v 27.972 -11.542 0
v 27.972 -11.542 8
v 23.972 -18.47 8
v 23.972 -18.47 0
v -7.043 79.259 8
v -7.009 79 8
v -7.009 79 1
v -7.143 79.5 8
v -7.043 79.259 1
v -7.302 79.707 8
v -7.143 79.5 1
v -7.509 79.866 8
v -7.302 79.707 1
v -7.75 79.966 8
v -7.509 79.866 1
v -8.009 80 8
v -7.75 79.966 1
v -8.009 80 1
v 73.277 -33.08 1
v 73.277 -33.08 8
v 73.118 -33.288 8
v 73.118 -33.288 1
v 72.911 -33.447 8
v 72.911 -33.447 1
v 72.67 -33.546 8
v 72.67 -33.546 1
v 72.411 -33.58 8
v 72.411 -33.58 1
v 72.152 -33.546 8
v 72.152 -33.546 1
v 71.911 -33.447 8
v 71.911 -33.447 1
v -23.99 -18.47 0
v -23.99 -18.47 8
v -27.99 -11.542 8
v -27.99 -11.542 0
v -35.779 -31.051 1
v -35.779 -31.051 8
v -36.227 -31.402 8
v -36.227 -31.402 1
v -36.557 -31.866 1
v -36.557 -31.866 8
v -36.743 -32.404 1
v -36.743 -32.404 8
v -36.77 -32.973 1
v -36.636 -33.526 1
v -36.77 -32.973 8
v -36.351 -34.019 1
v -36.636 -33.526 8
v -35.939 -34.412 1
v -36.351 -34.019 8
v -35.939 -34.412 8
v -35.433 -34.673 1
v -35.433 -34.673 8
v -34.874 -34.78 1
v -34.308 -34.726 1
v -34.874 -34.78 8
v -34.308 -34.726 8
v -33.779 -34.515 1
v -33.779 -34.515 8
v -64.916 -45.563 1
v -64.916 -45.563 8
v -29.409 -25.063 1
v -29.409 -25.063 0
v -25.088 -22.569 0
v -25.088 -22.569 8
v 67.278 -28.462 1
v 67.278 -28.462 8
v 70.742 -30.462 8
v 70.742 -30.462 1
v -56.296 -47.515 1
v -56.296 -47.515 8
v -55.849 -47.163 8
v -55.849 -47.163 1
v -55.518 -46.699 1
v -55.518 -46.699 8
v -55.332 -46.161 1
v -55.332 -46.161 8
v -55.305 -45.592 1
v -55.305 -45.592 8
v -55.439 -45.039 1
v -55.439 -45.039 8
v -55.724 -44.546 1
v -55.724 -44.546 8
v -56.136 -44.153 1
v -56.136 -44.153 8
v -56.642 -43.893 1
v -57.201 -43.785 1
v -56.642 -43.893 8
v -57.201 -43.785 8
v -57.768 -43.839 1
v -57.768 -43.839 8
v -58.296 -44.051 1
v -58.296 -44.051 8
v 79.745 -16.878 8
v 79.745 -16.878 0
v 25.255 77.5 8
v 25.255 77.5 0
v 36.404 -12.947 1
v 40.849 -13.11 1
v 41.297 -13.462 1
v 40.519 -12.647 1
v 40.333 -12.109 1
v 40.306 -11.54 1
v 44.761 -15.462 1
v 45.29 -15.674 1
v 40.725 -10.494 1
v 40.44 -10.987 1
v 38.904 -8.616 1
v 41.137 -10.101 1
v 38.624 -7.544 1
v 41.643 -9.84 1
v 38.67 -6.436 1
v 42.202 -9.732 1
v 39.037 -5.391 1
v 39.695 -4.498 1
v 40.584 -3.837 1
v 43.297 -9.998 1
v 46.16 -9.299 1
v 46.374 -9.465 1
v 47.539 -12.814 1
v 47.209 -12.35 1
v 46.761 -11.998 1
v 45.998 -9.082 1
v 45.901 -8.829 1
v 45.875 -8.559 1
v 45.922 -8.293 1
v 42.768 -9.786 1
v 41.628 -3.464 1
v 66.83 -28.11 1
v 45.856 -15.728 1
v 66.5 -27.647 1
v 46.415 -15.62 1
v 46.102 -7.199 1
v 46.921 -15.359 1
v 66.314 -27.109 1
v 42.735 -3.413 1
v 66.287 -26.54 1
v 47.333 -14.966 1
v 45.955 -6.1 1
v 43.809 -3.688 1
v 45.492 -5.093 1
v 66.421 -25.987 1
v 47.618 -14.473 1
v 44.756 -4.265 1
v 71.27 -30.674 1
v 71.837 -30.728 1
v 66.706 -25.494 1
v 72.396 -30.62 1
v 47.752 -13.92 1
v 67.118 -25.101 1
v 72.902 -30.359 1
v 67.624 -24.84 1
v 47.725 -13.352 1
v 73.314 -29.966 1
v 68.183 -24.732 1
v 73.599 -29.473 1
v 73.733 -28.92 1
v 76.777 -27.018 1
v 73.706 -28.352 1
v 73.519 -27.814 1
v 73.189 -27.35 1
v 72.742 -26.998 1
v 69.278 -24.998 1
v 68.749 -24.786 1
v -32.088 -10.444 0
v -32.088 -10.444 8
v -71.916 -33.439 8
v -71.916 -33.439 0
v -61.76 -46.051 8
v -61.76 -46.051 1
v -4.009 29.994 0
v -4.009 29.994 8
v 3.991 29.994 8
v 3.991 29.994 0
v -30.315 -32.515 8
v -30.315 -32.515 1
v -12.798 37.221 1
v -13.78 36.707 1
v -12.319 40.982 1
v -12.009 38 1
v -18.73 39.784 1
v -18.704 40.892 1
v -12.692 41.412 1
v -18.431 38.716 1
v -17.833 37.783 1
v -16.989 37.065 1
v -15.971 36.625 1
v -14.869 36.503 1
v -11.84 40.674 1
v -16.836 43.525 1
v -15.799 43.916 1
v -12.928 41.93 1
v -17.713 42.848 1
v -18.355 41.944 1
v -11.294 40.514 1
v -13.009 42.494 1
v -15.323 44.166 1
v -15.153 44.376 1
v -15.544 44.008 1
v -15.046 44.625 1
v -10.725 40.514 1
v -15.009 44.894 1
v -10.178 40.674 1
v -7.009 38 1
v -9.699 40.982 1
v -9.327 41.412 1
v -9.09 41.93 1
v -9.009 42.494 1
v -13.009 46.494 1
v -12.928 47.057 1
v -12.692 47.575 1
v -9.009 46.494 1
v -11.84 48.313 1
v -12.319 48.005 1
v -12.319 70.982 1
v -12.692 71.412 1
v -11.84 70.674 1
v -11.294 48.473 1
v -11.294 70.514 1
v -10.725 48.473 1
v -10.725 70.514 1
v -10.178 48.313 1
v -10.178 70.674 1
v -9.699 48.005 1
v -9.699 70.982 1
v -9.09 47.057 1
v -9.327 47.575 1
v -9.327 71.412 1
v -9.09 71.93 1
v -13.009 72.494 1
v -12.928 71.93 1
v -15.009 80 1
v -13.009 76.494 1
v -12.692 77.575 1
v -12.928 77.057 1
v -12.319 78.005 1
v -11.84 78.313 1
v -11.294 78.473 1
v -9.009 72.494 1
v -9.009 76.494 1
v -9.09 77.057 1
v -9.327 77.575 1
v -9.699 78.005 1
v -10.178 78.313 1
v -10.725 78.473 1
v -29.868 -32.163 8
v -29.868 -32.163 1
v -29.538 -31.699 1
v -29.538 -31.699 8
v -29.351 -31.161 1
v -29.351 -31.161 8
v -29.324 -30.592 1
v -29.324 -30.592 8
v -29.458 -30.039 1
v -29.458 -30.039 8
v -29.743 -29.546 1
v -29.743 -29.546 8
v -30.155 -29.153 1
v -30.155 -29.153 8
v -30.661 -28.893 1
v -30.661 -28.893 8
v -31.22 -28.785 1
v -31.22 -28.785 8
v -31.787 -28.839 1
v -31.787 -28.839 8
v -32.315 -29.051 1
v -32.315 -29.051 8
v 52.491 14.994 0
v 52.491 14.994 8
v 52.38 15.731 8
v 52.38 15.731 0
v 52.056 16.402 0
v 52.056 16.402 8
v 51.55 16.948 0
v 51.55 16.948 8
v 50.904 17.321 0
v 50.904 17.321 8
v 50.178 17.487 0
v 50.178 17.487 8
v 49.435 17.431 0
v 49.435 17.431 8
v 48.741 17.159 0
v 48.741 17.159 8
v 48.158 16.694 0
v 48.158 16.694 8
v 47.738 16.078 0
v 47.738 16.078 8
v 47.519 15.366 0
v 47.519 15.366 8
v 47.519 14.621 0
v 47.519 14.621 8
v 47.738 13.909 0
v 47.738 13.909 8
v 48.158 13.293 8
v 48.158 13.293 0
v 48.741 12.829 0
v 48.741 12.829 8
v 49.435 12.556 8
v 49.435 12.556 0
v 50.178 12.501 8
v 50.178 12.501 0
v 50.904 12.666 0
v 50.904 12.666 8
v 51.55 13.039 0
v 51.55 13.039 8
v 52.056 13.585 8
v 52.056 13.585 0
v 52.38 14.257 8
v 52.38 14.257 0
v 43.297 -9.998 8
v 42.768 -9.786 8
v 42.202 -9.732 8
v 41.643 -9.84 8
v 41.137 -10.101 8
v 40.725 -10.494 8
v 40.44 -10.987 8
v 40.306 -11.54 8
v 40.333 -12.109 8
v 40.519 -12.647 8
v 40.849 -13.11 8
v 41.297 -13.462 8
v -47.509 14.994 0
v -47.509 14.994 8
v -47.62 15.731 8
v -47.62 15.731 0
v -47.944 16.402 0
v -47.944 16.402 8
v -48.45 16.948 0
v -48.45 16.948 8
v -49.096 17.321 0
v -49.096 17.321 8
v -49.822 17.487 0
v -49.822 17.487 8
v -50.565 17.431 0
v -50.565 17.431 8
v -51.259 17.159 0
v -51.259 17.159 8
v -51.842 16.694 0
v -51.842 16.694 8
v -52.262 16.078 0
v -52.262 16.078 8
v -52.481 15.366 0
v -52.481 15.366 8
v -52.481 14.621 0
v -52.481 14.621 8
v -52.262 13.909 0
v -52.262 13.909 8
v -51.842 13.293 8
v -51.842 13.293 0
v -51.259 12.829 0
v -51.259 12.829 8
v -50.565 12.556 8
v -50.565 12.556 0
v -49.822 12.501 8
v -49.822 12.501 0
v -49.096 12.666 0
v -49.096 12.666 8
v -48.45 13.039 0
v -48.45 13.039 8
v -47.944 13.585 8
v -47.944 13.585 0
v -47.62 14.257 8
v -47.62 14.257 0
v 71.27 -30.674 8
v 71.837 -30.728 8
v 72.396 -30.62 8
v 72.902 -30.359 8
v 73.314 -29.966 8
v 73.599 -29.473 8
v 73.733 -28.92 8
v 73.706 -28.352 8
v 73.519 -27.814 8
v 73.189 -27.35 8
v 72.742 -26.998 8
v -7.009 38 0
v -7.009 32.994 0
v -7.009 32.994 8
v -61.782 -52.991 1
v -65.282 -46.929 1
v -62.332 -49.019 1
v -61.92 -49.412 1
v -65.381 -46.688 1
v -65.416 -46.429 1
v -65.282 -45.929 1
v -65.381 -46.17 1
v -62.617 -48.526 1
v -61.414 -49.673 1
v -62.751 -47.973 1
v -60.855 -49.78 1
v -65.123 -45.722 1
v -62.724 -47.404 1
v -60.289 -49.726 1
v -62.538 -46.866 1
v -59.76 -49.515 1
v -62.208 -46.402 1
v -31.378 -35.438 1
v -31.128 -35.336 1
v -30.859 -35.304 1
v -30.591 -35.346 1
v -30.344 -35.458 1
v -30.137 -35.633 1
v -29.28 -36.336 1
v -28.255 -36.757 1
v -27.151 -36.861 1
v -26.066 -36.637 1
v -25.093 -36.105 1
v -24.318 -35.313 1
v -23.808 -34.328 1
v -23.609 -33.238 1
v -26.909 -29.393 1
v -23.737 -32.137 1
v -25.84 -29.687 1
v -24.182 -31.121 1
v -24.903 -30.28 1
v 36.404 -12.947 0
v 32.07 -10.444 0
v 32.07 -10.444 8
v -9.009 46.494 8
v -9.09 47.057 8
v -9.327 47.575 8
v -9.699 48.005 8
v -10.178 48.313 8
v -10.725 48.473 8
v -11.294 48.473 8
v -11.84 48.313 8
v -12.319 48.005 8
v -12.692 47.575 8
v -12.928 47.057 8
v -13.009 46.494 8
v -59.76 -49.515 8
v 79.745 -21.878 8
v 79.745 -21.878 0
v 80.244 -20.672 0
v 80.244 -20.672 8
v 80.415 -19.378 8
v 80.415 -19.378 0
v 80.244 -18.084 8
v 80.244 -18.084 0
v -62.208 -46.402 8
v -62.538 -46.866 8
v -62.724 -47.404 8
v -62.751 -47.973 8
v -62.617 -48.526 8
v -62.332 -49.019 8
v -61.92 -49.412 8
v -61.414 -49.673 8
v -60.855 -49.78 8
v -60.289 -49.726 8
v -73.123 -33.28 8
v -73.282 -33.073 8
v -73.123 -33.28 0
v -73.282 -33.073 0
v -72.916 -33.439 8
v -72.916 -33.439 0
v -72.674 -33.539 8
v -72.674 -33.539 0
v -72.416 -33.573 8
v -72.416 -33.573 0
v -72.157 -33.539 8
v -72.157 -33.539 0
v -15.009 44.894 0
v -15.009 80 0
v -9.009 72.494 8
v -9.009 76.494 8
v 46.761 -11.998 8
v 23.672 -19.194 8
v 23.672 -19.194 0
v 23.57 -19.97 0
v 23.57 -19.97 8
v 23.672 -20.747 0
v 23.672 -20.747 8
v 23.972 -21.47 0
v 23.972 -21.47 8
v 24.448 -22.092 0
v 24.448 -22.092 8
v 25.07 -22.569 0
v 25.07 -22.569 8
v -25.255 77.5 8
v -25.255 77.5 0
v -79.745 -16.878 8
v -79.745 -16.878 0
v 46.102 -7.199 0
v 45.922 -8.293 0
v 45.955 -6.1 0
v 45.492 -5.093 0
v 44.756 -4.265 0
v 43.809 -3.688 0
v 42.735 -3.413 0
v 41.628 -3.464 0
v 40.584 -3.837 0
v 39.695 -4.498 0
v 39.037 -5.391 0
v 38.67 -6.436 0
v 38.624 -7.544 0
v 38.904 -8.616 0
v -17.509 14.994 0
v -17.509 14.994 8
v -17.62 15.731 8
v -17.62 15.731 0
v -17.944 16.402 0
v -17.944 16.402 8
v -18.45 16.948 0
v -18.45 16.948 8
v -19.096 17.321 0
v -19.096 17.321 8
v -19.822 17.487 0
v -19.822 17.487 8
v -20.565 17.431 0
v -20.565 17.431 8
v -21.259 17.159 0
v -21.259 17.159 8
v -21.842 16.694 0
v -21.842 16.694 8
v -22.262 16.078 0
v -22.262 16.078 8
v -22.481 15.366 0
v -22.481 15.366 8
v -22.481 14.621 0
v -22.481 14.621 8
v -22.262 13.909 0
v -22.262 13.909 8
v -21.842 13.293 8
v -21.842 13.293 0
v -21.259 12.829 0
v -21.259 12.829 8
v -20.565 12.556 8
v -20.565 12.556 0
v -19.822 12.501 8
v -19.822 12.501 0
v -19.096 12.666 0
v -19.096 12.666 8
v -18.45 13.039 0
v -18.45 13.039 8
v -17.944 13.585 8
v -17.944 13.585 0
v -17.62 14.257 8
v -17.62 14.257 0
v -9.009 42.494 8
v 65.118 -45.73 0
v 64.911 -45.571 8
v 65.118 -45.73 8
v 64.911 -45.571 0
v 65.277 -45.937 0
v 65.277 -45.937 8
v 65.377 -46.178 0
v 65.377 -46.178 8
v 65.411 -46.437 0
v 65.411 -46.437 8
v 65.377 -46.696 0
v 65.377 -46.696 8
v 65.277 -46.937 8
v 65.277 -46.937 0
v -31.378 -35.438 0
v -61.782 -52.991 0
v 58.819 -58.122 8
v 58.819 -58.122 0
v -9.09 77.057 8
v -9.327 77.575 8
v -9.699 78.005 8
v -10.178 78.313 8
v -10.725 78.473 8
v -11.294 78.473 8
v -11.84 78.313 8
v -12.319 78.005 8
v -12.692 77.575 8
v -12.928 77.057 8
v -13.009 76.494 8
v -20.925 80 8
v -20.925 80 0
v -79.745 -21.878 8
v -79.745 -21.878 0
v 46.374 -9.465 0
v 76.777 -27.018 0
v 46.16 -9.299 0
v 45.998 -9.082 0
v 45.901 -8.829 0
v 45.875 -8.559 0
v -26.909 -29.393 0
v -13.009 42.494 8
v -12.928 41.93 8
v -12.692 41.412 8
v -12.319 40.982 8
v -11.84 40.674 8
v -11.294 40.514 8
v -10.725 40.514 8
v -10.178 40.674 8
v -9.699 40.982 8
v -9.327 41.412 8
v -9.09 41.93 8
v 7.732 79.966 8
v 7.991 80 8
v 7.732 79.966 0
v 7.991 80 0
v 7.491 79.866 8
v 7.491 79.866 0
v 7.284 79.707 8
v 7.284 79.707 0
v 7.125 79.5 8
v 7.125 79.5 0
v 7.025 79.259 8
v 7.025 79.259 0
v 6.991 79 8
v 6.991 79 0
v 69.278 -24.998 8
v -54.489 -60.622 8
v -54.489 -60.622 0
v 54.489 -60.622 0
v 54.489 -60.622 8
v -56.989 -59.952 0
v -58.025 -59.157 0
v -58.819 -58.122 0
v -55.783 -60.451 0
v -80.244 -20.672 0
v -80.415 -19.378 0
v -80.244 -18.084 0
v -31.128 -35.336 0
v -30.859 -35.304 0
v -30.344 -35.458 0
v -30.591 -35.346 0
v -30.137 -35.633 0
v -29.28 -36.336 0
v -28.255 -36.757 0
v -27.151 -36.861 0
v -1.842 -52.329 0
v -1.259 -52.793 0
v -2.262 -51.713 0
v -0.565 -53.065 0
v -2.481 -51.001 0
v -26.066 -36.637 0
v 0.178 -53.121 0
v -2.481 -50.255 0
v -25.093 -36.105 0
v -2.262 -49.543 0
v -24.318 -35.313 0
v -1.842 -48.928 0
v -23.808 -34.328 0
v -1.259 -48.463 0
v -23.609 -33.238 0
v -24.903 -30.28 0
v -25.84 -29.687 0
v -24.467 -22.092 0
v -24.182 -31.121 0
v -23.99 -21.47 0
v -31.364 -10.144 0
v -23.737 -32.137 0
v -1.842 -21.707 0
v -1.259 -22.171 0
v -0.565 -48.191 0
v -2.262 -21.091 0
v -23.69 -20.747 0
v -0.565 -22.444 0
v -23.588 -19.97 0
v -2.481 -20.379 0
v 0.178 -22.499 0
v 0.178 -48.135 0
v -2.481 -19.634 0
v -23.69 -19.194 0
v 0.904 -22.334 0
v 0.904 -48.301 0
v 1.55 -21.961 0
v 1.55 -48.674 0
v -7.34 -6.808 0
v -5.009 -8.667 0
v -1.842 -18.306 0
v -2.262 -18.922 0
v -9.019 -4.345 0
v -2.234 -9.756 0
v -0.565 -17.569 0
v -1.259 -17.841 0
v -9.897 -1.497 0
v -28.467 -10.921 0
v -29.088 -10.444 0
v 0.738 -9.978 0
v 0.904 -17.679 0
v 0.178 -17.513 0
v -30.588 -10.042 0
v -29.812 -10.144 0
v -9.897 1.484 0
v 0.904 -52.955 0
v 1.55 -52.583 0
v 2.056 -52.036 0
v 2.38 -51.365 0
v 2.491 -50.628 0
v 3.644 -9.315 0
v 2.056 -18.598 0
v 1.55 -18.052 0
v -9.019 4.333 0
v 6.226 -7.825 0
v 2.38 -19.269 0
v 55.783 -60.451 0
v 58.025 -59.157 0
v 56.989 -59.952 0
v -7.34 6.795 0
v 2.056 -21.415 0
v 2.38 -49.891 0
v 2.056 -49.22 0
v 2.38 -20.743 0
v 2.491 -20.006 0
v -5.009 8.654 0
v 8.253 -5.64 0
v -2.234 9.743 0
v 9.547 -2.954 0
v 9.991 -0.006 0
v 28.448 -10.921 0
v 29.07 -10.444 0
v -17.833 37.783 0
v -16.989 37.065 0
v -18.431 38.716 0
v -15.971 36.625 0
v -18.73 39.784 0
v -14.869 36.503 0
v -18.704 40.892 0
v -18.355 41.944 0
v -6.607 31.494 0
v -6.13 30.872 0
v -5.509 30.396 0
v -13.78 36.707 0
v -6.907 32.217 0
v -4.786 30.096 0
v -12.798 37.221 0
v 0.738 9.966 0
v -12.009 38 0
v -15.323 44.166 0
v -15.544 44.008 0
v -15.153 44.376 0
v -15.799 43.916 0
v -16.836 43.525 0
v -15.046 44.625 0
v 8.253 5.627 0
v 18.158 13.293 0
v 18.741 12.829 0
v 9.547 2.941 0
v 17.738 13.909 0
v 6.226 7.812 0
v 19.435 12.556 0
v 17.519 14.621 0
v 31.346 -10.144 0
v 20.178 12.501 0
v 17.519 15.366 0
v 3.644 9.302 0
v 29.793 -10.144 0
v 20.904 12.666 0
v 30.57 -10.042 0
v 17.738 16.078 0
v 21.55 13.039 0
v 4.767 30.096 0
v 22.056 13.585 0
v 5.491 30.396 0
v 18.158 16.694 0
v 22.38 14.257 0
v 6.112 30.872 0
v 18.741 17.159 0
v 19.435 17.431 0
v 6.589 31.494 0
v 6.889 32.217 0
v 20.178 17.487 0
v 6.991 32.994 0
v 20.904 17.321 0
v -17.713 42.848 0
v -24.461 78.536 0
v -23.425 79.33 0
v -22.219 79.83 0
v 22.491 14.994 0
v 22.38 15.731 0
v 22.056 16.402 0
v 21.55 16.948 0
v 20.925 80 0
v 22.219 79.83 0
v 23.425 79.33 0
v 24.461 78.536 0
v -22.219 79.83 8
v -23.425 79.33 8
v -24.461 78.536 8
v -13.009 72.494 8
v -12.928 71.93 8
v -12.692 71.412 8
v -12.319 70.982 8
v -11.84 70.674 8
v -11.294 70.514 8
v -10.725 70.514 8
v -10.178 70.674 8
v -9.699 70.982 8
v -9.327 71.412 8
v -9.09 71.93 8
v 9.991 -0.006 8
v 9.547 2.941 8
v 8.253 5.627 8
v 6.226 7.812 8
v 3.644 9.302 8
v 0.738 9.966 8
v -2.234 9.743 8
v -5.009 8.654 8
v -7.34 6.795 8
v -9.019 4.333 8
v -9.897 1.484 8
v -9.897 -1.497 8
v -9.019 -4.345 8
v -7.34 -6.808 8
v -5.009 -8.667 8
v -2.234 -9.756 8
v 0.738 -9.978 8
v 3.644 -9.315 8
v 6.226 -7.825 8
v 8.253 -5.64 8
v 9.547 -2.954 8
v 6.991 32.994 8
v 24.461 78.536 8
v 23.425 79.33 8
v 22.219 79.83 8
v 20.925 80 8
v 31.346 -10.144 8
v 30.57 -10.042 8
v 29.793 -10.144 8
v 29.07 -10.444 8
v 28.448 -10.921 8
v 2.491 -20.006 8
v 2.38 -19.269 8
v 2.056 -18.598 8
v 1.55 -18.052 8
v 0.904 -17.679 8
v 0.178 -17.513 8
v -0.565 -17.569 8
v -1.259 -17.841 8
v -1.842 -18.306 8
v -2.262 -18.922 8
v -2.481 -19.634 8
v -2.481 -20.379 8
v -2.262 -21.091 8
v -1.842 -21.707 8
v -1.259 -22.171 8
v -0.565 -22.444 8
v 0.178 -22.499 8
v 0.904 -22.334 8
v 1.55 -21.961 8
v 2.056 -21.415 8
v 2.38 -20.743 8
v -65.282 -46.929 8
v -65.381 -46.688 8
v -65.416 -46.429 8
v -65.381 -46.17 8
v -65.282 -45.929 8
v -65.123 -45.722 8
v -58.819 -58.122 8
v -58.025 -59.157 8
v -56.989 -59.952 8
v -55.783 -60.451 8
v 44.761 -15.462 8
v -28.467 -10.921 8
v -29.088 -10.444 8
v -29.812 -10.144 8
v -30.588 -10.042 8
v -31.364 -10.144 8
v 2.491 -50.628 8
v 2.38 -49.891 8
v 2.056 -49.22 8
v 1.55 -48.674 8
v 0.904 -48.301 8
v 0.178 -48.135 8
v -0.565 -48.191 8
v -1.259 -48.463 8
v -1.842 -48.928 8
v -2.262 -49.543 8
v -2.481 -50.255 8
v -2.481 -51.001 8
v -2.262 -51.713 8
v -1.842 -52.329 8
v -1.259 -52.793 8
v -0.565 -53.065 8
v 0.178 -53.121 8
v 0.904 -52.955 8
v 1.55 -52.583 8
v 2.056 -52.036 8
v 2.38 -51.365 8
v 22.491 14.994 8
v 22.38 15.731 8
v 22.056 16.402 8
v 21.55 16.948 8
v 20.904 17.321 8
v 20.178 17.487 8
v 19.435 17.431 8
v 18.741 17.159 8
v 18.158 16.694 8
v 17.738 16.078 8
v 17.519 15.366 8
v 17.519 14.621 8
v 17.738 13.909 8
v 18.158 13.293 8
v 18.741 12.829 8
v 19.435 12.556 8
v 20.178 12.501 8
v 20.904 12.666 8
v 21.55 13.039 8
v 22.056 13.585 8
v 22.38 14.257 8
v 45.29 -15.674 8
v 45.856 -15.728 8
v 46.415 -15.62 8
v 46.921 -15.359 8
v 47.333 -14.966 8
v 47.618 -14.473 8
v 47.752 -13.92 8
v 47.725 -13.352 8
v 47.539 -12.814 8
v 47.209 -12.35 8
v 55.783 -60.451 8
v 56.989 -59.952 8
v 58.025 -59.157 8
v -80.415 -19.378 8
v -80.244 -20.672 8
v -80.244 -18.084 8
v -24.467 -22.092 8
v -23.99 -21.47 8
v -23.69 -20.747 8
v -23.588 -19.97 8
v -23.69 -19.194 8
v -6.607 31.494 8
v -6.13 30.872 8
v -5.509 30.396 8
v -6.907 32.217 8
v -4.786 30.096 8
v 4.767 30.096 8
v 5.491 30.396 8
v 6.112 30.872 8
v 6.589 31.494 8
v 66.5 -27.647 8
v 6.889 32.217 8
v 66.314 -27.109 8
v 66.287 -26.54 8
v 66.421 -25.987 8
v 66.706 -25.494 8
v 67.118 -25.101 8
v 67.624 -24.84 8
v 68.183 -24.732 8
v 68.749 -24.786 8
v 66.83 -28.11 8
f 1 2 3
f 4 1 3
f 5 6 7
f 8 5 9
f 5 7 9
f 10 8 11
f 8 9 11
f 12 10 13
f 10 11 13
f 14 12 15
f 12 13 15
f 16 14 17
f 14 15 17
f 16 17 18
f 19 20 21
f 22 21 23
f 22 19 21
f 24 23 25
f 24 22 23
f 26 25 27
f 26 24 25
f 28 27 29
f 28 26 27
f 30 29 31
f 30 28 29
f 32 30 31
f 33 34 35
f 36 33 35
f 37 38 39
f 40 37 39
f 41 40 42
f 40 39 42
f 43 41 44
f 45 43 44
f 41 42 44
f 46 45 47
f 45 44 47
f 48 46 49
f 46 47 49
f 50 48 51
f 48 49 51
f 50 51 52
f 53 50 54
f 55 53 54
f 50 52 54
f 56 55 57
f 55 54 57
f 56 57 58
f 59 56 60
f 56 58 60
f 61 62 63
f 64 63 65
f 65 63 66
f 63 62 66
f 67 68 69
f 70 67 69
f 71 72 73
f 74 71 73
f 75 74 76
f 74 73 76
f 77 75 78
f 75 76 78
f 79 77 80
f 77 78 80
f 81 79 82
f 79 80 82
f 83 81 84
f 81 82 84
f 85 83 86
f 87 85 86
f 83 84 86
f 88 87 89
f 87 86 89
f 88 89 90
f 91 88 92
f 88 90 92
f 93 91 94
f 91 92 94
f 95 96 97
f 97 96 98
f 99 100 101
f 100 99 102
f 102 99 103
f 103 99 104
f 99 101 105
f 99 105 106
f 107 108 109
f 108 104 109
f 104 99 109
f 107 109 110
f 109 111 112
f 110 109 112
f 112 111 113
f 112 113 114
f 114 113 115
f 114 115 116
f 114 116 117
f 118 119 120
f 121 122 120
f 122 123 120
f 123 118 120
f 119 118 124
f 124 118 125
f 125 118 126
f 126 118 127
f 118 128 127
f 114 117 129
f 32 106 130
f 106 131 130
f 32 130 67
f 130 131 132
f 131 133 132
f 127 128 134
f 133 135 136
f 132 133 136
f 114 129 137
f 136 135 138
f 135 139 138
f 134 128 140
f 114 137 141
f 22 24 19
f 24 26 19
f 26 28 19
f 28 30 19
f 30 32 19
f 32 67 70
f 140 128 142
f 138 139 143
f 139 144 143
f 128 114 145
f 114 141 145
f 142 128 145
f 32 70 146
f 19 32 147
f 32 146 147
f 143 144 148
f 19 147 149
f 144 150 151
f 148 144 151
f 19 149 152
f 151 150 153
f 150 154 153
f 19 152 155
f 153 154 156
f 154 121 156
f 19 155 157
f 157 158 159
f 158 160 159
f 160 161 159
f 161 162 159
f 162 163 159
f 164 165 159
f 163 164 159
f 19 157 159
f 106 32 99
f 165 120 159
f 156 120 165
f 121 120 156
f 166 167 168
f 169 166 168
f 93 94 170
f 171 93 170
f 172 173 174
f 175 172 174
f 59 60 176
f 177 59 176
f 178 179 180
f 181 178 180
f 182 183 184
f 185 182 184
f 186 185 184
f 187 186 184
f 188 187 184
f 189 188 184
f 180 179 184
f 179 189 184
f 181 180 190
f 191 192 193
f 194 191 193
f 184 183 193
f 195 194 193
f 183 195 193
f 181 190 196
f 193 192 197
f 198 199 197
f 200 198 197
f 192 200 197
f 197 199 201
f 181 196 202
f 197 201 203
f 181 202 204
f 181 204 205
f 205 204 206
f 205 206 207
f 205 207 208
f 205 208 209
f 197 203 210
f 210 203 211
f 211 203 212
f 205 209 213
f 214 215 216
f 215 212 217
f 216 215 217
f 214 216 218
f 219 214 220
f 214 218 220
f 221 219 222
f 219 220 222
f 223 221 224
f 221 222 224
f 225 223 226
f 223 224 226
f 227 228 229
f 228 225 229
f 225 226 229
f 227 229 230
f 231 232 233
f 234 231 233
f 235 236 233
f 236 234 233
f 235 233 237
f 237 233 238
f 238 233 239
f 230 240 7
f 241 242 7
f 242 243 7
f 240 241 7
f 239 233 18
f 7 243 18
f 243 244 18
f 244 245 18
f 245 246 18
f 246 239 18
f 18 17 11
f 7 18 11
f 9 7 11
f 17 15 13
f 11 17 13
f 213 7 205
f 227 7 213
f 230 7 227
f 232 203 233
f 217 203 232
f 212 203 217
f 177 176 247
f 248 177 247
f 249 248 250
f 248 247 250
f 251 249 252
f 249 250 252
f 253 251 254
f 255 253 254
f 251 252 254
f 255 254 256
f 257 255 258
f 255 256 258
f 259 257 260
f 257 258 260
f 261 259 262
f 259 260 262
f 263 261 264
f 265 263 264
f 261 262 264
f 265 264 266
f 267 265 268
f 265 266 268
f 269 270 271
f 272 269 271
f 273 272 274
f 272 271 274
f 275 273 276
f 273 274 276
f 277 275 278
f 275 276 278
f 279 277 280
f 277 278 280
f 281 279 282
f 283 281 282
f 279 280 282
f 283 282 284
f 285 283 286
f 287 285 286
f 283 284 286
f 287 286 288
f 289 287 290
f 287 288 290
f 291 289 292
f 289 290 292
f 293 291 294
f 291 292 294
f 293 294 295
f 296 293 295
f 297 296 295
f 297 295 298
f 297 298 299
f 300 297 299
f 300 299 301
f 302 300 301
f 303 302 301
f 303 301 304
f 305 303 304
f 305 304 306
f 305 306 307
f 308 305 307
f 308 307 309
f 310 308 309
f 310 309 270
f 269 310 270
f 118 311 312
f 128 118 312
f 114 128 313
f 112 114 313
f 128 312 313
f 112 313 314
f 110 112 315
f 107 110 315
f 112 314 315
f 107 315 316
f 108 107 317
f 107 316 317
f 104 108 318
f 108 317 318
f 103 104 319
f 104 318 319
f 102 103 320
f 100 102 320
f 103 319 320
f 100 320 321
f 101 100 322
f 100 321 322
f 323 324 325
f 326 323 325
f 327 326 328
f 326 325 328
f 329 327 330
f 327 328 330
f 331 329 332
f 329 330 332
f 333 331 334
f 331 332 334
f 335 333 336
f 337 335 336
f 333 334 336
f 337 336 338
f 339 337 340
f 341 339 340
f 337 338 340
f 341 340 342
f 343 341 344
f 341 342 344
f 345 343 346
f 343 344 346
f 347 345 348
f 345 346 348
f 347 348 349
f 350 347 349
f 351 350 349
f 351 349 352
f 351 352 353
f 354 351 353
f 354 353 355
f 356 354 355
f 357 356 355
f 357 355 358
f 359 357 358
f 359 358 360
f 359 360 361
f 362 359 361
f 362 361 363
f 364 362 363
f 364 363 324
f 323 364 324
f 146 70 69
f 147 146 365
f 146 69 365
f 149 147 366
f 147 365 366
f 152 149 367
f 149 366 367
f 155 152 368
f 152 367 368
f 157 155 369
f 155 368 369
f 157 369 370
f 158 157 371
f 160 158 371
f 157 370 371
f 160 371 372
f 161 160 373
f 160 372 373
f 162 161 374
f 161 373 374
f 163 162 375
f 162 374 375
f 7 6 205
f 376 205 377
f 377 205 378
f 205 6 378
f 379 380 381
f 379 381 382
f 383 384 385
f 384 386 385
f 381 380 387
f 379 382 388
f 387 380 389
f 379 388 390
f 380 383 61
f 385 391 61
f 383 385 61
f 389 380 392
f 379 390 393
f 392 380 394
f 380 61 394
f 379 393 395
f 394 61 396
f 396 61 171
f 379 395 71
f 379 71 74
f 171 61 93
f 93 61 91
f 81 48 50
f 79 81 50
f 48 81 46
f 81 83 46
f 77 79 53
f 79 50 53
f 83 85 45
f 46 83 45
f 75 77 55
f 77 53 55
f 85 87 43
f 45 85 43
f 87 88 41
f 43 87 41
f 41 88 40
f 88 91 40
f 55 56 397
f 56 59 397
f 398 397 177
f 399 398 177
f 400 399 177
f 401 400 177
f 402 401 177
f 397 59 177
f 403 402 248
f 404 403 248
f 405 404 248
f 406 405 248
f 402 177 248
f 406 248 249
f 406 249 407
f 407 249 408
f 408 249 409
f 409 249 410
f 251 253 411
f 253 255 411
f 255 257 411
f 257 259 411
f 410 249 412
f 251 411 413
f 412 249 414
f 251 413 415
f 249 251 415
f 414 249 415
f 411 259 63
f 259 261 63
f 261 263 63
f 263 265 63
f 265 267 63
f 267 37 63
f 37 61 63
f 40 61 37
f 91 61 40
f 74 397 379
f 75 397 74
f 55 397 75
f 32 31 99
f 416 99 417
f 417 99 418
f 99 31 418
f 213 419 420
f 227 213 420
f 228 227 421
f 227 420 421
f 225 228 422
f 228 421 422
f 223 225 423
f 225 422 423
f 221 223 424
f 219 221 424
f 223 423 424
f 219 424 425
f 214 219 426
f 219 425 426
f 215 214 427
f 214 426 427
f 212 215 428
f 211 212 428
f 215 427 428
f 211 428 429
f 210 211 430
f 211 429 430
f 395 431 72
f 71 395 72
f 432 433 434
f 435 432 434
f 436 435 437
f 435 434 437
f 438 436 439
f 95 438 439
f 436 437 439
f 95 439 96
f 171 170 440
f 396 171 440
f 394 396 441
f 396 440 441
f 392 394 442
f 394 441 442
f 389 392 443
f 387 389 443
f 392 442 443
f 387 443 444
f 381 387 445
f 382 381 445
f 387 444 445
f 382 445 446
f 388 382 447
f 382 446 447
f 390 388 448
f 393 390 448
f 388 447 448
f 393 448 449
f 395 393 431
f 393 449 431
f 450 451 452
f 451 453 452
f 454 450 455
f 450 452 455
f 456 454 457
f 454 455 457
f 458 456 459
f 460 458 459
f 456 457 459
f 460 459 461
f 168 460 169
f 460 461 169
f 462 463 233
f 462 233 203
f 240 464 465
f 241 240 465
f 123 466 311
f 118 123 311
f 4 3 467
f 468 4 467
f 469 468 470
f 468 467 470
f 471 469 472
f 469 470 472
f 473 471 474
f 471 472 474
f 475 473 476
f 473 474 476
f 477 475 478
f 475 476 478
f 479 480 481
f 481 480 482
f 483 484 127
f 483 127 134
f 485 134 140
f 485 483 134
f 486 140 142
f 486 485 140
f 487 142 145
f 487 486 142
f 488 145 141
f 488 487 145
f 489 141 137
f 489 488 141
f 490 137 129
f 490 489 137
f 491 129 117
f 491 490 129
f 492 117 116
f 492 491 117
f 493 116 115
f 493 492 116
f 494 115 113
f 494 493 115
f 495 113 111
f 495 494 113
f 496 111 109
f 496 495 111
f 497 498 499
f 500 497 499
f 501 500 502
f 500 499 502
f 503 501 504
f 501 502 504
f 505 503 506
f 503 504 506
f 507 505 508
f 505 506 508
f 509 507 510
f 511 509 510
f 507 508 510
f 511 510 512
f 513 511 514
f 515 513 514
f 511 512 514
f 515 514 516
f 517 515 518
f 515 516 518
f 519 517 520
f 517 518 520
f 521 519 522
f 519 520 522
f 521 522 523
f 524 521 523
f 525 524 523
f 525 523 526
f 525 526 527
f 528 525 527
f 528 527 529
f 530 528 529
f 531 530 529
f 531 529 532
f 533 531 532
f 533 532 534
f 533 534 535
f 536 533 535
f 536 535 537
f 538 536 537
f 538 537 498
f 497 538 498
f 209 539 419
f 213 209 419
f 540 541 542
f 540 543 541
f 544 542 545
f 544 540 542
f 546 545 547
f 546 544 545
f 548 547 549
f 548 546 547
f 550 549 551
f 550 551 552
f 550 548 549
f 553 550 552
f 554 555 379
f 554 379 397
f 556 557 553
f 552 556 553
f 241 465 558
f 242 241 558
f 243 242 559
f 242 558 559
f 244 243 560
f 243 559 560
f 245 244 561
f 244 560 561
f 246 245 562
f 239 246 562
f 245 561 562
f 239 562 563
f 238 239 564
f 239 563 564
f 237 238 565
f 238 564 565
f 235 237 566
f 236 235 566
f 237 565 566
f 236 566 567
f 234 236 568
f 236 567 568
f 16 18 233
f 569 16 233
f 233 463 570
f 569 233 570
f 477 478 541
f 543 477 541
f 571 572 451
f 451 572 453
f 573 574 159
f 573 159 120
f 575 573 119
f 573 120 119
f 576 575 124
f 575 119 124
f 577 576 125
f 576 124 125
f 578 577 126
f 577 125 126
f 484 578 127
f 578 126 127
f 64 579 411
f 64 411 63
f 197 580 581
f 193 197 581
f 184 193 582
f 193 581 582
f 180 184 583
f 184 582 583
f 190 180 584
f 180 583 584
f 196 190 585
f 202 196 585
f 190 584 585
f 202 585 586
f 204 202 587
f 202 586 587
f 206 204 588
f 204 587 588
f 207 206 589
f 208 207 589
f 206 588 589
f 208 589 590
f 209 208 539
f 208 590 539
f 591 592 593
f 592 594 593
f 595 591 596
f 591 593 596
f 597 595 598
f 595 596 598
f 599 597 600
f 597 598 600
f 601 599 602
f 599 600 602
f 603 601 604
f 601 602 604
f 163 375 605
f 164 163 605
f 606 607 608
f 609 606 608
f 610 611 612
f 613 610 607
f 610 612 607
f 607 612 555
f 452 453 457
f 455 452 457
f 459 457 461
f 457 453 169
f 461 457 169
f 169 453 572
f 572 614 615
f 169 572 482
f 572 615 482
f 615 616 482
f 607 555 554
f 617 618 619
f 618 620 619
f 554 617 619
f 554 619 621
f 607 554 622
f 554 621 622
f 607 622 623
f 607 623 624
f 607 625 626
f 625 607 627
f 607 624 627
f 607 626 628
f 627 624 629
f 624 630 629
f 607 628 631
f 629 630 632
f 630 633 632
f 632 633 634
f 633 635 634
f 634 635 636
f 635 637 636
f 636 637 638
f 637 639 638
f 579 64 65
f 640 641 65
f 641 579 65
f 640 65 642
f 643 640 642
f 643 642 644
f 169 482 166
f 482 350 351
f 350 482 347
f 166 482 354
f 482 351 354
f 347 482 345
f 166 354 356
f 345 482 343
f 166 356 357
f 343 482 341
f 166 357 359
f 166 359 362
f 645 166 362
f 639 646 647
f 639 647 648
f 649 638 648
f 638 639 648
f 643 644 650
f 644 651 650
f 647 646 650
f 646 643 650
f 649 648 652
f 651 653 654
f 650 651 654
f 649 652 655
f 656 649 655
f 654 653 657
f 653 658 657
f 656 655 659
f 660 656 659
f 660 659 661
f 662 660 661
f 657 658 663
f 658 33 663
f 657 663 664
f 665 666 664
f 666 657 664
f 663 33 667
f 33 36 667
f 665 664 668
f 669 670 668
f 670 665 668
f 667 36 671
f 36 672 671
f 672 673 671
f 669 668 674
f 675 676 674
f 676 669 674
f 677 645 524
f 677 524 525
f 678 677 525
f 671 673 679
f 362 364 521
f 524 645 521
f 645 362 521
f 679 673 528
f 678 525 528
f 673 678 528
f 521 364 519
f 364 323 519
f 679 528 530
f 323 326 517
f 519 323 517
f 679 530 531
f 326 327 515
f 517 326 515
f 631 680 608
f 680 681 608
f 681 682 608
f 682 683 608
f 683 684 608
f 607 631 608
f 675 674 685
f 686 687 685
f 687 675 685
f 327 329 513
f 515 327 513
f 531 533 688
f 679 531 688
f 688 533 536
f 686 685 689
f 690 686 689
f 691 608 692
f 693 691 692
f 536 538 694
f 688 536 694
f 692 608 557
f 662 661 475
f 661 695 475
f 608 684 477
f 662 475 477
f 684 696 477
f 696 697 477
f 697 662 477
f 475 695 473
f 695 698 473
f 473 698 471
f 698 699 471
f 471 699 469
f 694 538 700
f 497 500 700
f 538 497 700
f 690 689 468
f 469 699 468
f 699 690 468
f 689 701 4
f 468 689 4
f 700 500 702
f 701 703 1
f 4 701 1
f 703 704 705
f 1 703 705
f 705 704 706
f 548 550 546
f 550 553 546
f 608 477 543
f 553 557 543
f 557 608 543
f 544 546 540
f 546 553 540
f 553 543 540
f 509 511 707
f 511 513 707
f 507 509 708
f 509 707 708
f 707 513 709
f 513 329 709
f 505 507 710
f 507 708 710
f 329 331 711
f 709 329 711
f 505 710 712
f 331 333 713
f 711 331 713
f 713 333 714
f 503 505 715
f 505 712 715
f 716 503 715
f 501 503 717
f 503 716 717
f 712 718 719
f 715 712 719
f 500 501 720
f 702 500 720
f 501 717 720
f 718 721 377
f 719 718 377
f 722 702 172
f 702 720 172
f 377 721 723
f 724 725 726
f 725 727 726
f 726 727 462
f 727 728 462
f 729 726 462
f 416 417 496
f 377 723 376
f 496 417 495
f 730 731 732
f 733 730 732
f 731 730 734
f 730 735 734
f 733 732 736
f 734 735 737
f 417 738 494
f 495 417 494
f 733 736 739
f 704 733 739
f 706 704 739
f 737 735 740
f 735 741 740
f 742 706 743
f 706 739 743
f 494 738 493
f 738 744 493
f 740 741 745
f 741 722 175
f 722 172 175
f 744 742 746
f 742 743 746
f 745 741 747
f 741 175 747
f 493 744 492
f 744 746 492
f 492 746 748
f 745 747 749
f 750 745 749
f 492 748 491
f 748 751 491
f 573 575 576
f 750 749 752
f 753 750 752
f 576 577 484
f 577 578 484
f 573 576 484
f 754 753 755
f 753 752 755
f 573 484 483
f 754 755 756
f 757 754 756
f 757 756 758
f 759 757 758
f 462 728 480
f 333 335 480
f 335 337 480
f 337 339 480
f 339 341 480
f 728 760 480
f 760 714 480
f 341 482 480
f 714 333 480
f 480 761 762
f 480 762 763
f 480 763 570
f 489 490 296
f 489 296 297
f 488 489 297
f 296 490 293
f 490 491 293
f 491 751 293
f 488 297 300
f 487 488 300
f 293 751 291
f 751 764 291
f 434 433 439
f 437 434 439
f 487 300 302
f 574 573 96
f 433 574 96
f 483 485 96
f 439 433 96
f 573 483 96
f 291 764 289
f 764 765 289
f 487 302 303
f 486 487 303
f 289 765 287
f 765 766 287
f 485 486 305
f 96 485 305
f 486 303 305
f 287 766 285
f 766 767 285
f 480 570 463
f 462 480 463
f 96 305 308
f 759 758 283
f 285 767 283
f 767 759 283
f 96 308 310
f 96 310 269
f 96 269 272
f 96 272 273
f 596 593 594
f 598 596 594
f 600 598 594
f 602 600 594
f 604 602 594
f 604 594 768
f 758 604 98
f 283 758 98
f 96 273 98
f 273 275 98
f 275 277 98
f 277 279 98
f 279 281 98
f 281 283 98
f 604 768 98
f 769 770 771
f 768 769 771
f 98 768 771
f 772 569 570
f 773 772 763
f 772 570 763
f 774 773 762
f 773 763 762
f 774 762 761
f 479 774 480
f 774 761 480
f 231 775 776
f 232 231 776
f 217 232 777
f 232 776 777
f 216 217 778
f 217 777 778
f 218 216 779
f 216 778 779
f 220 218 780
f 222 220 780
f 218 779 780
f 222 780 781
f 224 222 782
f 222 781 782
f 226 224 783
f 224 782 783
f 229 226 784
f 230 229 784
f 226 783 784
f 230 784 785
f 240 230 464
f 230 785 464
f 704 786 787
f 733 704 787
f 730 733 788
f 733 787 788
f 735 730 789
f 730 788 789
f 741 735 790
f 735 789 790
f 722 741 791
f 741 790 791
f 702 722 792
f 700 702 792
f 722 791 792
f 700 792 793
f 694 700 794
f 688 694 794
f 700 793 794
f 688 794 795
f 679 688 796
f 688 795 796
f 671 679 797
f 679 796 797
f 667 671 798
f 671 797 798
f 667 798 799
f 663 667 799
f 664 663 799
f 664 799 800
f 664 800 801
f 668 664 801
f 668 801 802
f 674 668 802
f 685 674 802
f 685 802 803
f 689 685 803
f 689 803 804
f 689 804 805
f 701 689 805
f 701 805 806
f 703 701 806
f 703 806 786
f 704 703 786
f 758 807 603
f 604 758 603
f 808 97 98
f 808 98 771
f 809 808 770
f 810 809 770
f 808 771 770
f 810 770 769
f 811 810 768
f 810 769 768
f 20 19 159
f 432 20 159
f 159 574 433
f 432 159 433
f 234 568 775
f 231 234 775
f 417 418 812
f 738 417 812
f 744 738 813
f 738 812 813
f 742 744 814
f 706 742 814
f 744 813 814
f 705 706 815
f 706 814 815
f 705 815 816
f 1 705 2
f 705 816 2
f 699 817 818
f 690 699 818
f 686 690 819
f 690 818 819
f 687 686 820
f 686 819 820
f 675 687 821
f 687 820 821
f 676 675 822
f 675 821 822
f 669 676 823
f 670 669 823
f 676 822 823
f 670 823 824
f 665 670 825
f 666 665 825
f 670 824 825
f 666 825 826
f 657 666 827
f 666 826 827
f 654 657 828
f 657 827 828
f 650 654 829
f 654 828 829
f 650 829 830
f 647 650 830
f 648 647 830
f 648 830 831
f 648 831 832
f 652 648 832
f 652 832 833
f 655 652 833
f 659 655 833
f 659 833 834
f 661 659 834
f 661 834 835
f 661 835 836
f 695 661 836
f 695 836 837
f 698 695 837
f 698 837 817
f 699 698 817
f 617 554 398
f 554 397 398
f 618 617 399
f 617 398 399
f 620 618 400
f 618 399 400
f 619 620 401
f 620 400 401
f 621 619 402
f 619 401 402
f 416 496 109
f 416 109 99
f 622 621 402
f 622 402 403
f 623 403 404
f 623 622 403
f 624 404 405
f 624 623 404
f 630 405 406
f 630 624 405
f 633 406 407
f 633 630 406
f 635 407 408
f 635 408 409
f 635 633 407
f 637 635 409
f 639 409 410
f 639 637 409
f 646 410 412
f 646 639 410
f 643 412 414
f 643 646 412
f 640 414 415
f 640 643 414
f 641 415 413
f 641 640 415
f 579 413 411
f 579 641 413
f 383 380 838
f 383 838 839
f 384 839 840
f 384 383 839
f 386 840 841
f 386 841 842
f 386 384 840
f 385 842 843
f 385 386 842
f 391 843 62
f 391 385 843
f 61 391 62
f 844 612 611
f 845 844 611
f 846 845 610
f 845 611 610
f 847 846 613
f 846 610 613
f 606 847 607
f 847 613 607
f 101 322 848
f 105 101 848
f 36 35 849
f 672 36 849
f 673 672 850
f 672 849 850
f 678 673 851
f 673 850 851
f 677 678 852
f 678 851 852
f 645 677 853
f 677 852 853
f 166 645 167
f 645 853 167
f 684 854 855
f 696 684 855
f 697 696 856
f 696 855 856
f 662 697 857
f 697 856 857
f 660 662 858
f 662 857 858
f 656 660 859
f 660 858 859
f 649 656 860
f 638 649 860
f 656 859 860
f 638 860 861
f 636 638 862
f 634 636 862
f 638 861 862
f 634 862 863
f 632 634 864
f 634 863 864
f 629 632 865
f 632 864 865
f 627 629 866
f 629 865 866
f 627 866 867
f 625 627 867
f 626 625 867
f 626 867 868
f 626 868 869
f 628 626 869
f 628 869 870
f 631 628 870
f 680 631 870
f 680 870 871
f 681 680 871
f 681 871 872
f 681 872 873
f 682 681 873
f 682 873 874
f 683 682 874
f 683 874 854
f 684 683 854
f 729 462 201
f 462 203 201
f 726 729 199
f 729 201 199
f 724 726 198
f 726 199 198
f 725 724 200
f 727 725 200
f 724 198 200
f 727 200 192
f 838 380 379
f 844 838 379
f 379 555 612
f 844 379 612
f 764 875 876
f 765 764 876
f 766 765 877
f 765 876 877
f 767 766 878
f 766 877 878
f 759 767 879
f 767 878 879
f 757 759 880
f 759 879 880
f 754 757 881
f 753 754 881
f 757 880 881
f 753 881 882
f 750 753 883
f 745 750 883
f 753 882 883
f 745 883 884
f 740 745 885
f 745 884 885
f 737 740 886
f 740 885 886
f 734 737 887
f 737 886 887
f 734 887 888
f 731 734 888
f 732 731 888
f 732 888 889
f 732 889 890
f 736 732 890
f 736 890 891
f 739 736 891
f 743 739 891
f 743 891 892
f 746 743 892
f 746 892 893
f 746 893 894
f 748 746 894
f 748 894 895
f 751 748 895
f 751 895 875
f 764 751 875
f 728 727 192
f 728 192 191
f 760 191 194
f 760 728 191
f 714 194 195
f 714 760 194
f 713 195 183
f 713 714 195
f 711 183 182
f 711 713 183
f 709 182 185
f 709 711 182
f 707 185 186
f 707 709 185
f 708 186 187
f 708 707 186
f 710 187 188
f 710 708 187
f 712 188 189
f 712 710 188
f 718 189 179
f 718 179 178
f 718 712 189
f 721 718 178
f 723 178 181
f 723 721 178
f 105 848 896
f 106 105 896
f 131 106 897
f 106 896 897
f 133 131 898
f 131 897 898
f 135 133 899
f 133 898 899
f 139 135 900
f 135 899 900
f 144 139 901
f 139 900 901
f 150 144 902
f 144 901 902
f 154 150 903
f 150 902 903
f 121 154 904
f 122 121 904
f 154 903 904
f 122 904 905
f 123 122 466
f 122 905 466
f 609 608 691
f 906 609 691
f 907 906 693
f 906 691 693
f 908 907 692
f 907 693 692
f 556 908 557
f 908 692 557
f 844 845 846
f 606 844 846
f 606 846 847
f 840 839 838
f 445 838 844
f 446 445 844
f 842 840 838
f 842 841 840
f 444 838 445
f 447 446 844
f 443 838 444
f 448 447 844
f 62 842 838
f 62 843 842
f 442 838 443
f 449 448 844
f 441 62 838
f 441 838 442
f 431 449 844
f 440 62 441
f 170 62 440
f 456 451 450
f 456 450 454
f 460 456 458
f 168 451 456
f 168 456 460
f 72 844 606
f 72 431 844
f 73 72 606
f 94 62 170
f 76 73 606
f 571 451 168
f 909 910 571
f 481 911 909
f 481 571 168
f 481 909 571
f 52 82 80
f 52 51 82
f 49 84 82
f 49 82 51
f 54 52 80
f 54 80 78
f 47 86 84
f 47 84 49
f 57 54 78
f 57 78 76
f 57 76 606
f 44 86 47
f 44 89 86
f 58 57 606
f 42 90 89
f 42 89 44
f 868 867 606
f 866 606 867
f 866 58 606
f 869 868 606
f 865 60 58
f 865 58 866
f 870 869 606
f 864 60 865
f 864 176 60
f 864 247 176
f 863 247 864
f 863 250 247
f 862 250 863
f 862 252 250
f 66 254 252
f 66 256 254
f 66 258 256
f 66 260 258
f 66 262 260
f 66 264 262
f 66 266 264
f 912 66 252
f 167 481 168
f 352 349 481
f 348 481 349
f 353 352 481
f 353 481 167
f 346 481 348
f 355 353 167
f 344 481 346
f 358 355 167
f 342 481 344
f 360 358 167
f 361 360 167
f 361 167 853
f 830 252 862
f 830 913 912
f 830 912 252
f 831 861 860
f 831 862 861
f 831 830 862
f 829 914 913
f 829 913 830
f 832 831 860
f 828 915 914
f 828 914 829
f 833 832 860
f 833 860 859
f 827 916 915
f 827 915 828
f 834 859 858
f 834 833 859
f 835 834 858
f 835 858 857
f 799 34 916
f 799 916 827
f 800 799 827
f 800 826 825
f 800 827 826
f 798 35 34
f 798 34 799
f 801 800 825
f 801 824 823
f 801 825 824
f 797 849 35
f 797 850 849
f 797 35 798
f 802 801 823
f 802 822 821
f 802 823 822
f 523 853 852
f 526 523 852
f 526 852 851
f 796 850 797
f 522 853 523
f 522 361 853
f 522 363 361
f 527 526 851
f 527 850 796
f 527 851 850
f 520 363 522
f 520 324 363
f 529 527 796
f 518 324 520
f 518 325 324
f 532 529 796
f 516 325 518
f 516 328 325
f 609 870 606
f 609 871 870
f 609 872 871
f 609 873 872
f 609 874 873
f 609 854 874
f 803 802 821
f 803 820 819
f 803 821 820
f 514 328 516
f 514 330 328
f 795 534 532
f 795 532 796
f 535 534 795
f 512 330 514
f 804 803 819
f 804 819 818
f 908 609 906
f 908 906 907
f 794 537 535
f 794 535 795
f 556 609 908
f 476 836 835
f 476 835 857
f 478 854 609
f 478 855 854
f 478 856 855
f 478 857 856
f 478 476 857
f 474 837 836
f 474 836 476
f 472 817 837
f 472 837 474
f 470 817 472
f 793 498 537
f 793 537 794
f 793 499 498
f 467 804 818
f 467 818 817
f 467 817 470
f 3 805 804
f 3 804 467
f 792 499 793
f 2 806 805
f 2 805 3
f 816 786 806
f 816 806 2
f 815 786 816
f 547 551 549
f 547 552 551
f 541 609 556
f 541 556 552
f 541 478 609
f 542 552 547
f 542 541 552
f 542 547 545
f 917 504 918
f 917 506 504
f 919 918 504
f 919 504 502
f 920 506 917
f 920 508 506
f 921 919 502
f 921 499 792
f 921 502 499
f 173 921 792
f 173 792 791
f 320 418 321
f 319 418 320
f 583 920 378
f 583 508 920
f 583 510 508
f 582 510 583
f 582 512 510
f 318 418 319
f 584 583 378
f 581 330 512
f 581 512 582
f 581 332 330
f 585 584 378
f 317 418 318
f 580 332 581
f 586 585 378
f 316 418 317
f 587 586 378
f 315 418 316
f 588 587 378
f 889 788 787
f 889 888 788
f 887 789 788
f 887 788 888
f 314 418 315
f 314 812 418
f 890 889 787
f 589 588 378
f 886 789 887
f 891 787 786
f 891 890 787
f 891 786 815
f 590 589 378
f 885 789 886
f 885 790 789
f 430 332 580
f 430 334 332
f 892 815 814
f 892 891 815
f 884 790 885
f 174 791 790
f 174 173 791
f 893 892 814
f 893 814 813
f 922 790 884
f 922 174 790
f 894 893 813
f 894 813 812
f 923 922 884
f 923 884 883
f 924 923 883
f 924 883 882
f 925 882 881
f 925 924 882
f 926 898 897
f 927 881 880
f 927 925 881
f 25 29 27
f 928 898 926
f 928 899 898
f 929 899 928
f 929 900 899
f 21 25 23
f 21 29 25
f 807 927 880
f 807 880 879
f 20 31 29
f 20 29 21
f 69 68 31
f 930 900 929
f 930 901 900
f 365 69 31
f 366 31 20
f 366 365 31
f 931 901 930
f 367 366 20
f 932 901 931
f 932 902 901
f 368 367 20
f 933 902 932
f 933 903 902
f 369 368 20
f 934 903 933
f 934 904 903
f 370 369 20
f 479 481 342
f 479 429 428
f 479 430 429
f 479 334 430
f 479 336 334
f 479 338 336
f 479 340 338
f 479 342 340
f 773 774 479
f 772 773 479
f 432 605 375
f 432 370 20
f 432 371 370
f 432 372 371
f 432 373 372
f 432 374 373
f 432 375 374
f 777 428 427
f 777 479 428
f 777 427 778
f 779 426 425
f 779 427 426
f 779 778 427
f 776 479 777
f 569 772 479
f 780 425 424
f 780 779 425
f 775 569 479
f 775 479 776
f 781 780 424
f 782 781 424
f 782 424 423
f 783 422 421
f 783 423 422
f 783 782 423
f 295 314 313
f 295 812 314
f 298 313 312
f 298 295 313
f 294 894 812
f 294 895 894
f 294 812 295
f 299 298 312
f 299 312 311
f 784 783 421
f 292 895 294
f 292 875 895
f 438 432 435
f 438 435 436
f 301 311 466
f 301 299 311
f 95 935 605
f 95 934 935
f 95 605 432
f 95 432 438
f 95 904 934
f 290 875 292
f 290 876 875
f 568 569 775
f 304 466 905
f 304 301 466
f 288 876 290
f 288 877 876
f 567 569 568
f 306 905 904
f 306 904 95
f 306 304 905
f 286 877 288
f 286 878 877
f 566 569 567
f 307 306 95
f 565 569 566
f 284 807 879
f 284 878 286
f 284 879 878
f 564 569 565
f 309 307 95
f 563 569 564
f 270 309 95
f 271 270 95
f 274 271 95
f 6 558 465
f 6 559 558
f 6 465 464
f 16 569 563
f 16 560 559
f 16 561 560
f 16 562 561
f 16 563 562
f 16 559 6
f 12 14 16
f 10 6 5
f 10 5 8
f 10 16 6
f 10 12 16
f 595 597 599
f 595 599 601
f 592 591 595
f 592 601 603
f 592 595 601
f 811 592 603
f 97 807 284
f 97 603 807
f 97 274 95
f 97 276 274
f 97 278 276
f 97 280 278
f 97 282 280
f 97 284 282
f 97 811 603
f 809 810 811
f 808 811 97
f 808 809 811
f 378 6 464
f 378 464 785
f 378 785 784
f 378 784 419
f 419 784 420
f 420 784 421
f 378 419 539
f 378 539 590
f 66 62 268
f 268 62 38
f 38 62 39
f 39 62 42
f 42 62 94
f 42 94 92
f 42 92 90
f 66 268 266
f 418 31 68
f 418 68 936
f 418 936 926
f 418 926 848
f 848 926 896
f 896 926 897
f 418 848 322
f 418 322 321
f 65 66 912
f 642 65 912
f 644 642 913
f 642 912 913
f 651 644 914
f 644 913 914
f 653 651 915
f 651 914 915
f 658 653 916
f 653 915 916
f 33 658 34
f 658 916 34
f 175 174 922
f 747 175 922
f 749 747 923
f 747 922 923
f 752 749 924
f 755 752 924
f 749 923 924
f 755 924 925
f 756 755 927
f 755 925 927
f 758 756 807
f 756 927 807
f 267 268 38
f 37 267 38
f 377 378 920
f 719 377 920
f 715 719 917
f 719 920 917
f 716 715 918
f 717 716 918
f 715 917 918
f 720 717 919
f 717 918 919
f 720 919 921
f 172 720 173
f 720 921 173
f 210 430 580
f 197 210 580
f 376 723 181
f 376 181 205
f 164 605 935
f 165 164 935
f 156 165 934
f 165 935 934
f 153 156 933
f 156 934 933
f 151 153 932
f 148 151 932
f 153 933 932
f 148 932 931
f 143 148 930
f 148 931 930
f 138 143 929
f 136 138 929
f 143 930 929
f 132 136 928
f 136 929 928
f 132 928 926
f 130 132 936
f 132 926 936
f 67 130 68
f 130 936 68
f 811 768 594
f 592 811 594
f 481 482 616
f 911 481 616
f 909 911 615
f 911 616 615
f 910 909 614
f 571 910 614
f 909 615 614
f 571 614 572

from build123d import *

# Parameters (mm, degrees)
BOSS_EXTRUDE1_DEPTH = 8
SKETCH5_R           = 2.5
SKETCH5_R_2         = 10
CUT_EXTRUDE26_DEPTH = 9
FILLET2_R           = 1
FILLET3_R           = 1
CUT_EXTRUDE27_DEPTH = 1
FILLET4_R           = 1


with BuildPart() as part:
    # Sketch3 → Boss-Extrude1 (new body)
    with BuildSketch(Plane.XY):
        with BuildLine():
            Line((69.282032303, -40), (0, 0))
            Line((0, 0), (-69.282032302, -40))
            Line((-69.282032302, -40), (-58.819418743, -58.121778265))
            ThreePointArc((-58.819418743, -58.121778265), (-56.989291724, -59.951905284), (-54.489291724, -60.621778265))
            Line((-54.489291724, -60.621778265), (54.489291724, -60.621778265))
            ThreePointArc((54.489291724, -60.621778265), (56.989291724, -59.951905284), (58.819418743, -58.121778265))
            Line((58.819418743, -58.121778265), (69.282032303, -40))
        make_face()
        with BuildLine():
            Line((0, 80), (0, 0))
            Line((0, 0), (69.282032303, -40))
            Line((69.282032303, -40), (79.744645862, -21.878221735))
            ThreePointArc((79.744645862, -21.878221735), (80.414518843, -19.378221735), (79.744645862, -16.878221735))
            Line((79.744645862, -16.878221735), (25.255354138, 77.5))
            ThreePointArc((25.255354138, 77.5), (23.425227119, 79.330127019), (20.925227119, 80))
            Line((20.925227119, 80), (0, 80))
        make_face()
        with BuildLine():
            Line((-69.282032302, -40), (0, 0))
            Line((0, 0), (0, 80))
            Line((0, 80), (-20.925227119, 80))
            ThreePointArc((-20.925227119, 80), (-23.425227119, 79.330127019), (-25.255354138, 77.5))
            Line((-25.255354138, 77.5), (-79.744645862, -16.878221735))
            ThreePointArc((-79.744645862, -16.878221735), (-80.414518843, -19.378221735), (-79.744645862, -21.878221735))
            Line((-79.744645862, -21.878221735), (-69.282032302, -40))
        make_face()
    extrude(amount=BOSS_EXTRUDE1_DEPTH)

    # Sketch5 → Cut-Extrude26 (cut, through all)
    with BuildSketch(Plane.XY.offset(8)):
        with BuildLine():
            Line((6.99085892, 80), (-7.00914108, 80))
            Line((-7.00914108, 80), (-7.00914108, 32.993673427))
            ThreePointArc((-7.00914108, 32.993673427), (-6.130461423, 30.872353083), (-4.00914108, 29.993673427))
            Line((-4.00914108, 29.993673427), (3.99085892, 29.993673427))
            ThreePointArc((3.99085892, 29.993673427), (6.112179264, 30.872353083), (6.99085892, 32.993673427))
            Line((6.99085892, 32.993673427), (6.99085892, 80))
        make_face()
        with BuildLine():
            Line((-13.00914108, 76.493673427), (-13.00914108, 72.493673427))
            ThreePointArc((-13.00914108, 72.493673427), (-11.00914108, 70.493673427), (-9.00914108, 72.493673427))
            Line((-9.00914108, 72.493673427), (-9.00914108, 76.493673427))
            ThreePointArc((-9.00914108, 76.493673427), (-11.00914108, 78.493673427), (-13.00914108, 76.493673427))
        make_face()
        with BuildLine():
            Line((-13.00914108, 46.493673427), (-13.00914108, 42.493673427))
            ThreePointArc((-13.00914108, 42.493673427), (-11.00914108, 40.493673427), (-9.00914108, 42.493673427))
            Line((-9.00914108, 42.493673427), (-9.00914108, 46.493673427))
            ThreePointArc((-9.00914108, 46.493673427), (-11.00914108, 48.493673427), (-13.00914108, 46.493673427))
        make_face()
        with Locations((49.99085892, 14.993673427)):
            Circle(SKETCH5_R)
        with Locations((19.99085892, 14.993673427)):
            Circle(SKETCH5_R)
        with Locations((-20.00914108, 14.993673427)):
            Circle(SKETCH5_R)
        with Locations((-50.00914108, 14.993673427)):
            Circle(SKETCH5_R)
        with Locations((-0.00914108, -0.006326573)):
            Circle(SKETCH5_R_2)
        with BuildLine():
            Line((-32.087979405, -10.444148747), (-72.781578086, -33.9386089))
            Line((-72.781578086, -33.9386089), (-65.781578086, -46.062964553))
            Line((-65.781578086, -46.062964553), (-25.087979405, -22.5685044))
            ThreePointArc((-25.087979405, -22.5685044), (-23.690201926, -20.746885324), (-23.989903193, -18.470428188))
            Line((-23.989903193, -18.470428188), (-27.989903193, -11.542224958))
            ThreePointArc((-27.989903193, -11.542224958), (-29.811522269, -10.144447479), (-32.087979405, -10.444148747))
        make_face()
        with BuildLine():
            Line((-33.779322356, -34.514656822), (-30.315220741, -32.514656822))
            ThreePointArc((-30.315220741, -32.514656822), (-29.583169933, -29.782606015), (-32.315220741, -29.050555207))
            Line((-32.315220741, -29.050555207), (-35.779322356, -31.050555207))
            ThreePointArc((-35.779322356, -31.050555207), (-36.511373163, -33.782606015), (-33.779322356, -34.514656822))
        make_face()
        with BuildLine():
            Line((-59.760084469, -49.514656822), (-56.295982854, -47.514656822))
            ThreePointArc((-56.295982854, -47.514656822), (-55.563932046, -44.782606015), (-58.295982854, -44.050555207))
            Line((-58.295982854, -44.050555207), (-61.760084469, -46.050555207))
            ThreePointArc((-61.760084469, -46.050555207), (-62.492135277, -48.782606015), (-59.760084469, -49.514656822))
        make_face()
        with Locations((-0.00914108, -50.628104838)):
            Circle(SKETCH5_R)
        with Locations((-0.00914108, -20.006326573)):
            Circle(SKETCH5_R)
        with BuildLine():
            Line((65.777007546, -46.07088096), (72.777007546, -33.946525307))
            Line((72.777007546, -33.946525307), (32.069697245, -10.444148747))
            ThreePointArc((32.069697245, -10.444148747), (29.793240109, -10.144447479), (27.971621033, -11.542224958))
            Line((27.971621033, -11.542224958), (23.971621033, -18.470428188))
            ThreePointArc((23.971621033, -18.470428188), (23.671919766, -20.746885324), (25.069697245, -22.5685044))
            Line((25.069697245, -22.5685044), (65.777007546, -46.07088096))
        make_face()
        with BuildLine():
            Line((41.296938581, -13.462097939), (44.761040196, -15.462097939))
            ThreePointArc((44.761040196, -15.462097939), (47.493091003, -14.730047132), (46.761040196, -11.997996324))
            Line((46.761040196, -11.997996324), (43.296938581, -9.997996324))
            ThreePointArc((43.296938581, -9.997996324), (40.564887773, -10.730047132), (41.296938581, -13.462097939))
        make_face()
        with BuildLine():
            Line((67.277700694, -28.462097939), (70.741802309, -30.462097939))
            ThreePointArc((70.741802309, -30.462097939), (73.473853117, -29.730047132), (72.741802309, -26.997996324))
            Line((72.741802309, -26.997996324), (69.277700694, -24.997996324))
            ThreePointArc((69.277700694, -24.997996324), (66.545649887, -25.730047132), (67.277700694, -28.462097939))
        make_face()
    extrude(amount=-CUT_EXTRUDE26_DEPTH, mode=Mode.SUBTRACT)

    # Fillet2
    fillet2_edges = [part.edges().sort_by_distance(p)[0] for p in [
        (72.777007546, -33.946525307, 4),
    ]]
    fillet(fillet2_edges, radius=FILLET2_R)

    # Fillet3
    fillet3_edges = [part.edges().sort_by_distance(p)[0] for p in [
        (-65.781578086, -46.062964553, 4),
        (-72.781578086, -33.9386089, 4),
        (65.777007546, -46.07088096, 4),
        (-7.00914108, 80, 4),
        (6.99085892, 80, 4),
    ]]
    fillet(fillet3_edges, radius=FILLET3_R)

    # Sketch7 → Cut-Extrude27 (cut)
    with BuildSketch(Plane(origin=(0, 0, 0), x_dir=(-1, 0, 0), z_dir=(0, 0, -1))):
        with BuildLine():
            Line((61.781578086, -52.991167783), (30.60466355, -34.991167783))
            ThreePointArc((30.60466355, -34.991167783), (24.227648547, -35.182379801), (26.908511127, -29.393091572))
            Line((26.908511127, -29.393091572), (29.408511127, -25.062964553))
            Line((29.408511127, -25.062964553), (65.781578086, -46.062964553))
            Line((65.781578086, -46.062964553), (61.781578086, -52.991167783))
        make_face()
        with BuildLine():
            Line((-76.777007546, -27.018322077), (-45.60009301, -9.018322077))
            ThreePointArc((-45.60009301, -9.018322077), (-42.577179974, -3.400059076), (-38.903940587, -8.616398288))
            Line((-38.903940587, -8.616398288), (-36.403940587, -12.946525307))
            Line((-36.403940587, -12.946525307), (-72.777007546, -33.946525307))
            Line((-72.777007546, -33.946525307), (-76.777007546, -27.018322077))
        make_face()
        with BuildLine():
            Line((15.00914108, 80), (15.00914108, 44))
            ThreePointArc((15.00914108, 44), (18.363243046, 38.572949017), (12.00914108, 38))
            Line((12.00914108, 38), (7.00914108, 38))
            Line((7.00914108, 38), (7.00914108, 80))
            Line((7.00914108, 80), (15.00914108, 80))
        make_face()
    extrude(amount=-CUT_EXTRUDE27_DEPTH, mode=Mode.SUBTRACT)

    # Fillet4
    fillet4_edges = [part.edges().sort_by_distance(p)[0] for p in [
        (45.60009301, -9.018322077, 0.5),
        (-30.60466355, -34.991167783, 0.5),
        (-15.00914108, 44, 0.5),
    ]]
    fillet(fillet4_edges, radius=FILLET4_R)


solid = part.part
